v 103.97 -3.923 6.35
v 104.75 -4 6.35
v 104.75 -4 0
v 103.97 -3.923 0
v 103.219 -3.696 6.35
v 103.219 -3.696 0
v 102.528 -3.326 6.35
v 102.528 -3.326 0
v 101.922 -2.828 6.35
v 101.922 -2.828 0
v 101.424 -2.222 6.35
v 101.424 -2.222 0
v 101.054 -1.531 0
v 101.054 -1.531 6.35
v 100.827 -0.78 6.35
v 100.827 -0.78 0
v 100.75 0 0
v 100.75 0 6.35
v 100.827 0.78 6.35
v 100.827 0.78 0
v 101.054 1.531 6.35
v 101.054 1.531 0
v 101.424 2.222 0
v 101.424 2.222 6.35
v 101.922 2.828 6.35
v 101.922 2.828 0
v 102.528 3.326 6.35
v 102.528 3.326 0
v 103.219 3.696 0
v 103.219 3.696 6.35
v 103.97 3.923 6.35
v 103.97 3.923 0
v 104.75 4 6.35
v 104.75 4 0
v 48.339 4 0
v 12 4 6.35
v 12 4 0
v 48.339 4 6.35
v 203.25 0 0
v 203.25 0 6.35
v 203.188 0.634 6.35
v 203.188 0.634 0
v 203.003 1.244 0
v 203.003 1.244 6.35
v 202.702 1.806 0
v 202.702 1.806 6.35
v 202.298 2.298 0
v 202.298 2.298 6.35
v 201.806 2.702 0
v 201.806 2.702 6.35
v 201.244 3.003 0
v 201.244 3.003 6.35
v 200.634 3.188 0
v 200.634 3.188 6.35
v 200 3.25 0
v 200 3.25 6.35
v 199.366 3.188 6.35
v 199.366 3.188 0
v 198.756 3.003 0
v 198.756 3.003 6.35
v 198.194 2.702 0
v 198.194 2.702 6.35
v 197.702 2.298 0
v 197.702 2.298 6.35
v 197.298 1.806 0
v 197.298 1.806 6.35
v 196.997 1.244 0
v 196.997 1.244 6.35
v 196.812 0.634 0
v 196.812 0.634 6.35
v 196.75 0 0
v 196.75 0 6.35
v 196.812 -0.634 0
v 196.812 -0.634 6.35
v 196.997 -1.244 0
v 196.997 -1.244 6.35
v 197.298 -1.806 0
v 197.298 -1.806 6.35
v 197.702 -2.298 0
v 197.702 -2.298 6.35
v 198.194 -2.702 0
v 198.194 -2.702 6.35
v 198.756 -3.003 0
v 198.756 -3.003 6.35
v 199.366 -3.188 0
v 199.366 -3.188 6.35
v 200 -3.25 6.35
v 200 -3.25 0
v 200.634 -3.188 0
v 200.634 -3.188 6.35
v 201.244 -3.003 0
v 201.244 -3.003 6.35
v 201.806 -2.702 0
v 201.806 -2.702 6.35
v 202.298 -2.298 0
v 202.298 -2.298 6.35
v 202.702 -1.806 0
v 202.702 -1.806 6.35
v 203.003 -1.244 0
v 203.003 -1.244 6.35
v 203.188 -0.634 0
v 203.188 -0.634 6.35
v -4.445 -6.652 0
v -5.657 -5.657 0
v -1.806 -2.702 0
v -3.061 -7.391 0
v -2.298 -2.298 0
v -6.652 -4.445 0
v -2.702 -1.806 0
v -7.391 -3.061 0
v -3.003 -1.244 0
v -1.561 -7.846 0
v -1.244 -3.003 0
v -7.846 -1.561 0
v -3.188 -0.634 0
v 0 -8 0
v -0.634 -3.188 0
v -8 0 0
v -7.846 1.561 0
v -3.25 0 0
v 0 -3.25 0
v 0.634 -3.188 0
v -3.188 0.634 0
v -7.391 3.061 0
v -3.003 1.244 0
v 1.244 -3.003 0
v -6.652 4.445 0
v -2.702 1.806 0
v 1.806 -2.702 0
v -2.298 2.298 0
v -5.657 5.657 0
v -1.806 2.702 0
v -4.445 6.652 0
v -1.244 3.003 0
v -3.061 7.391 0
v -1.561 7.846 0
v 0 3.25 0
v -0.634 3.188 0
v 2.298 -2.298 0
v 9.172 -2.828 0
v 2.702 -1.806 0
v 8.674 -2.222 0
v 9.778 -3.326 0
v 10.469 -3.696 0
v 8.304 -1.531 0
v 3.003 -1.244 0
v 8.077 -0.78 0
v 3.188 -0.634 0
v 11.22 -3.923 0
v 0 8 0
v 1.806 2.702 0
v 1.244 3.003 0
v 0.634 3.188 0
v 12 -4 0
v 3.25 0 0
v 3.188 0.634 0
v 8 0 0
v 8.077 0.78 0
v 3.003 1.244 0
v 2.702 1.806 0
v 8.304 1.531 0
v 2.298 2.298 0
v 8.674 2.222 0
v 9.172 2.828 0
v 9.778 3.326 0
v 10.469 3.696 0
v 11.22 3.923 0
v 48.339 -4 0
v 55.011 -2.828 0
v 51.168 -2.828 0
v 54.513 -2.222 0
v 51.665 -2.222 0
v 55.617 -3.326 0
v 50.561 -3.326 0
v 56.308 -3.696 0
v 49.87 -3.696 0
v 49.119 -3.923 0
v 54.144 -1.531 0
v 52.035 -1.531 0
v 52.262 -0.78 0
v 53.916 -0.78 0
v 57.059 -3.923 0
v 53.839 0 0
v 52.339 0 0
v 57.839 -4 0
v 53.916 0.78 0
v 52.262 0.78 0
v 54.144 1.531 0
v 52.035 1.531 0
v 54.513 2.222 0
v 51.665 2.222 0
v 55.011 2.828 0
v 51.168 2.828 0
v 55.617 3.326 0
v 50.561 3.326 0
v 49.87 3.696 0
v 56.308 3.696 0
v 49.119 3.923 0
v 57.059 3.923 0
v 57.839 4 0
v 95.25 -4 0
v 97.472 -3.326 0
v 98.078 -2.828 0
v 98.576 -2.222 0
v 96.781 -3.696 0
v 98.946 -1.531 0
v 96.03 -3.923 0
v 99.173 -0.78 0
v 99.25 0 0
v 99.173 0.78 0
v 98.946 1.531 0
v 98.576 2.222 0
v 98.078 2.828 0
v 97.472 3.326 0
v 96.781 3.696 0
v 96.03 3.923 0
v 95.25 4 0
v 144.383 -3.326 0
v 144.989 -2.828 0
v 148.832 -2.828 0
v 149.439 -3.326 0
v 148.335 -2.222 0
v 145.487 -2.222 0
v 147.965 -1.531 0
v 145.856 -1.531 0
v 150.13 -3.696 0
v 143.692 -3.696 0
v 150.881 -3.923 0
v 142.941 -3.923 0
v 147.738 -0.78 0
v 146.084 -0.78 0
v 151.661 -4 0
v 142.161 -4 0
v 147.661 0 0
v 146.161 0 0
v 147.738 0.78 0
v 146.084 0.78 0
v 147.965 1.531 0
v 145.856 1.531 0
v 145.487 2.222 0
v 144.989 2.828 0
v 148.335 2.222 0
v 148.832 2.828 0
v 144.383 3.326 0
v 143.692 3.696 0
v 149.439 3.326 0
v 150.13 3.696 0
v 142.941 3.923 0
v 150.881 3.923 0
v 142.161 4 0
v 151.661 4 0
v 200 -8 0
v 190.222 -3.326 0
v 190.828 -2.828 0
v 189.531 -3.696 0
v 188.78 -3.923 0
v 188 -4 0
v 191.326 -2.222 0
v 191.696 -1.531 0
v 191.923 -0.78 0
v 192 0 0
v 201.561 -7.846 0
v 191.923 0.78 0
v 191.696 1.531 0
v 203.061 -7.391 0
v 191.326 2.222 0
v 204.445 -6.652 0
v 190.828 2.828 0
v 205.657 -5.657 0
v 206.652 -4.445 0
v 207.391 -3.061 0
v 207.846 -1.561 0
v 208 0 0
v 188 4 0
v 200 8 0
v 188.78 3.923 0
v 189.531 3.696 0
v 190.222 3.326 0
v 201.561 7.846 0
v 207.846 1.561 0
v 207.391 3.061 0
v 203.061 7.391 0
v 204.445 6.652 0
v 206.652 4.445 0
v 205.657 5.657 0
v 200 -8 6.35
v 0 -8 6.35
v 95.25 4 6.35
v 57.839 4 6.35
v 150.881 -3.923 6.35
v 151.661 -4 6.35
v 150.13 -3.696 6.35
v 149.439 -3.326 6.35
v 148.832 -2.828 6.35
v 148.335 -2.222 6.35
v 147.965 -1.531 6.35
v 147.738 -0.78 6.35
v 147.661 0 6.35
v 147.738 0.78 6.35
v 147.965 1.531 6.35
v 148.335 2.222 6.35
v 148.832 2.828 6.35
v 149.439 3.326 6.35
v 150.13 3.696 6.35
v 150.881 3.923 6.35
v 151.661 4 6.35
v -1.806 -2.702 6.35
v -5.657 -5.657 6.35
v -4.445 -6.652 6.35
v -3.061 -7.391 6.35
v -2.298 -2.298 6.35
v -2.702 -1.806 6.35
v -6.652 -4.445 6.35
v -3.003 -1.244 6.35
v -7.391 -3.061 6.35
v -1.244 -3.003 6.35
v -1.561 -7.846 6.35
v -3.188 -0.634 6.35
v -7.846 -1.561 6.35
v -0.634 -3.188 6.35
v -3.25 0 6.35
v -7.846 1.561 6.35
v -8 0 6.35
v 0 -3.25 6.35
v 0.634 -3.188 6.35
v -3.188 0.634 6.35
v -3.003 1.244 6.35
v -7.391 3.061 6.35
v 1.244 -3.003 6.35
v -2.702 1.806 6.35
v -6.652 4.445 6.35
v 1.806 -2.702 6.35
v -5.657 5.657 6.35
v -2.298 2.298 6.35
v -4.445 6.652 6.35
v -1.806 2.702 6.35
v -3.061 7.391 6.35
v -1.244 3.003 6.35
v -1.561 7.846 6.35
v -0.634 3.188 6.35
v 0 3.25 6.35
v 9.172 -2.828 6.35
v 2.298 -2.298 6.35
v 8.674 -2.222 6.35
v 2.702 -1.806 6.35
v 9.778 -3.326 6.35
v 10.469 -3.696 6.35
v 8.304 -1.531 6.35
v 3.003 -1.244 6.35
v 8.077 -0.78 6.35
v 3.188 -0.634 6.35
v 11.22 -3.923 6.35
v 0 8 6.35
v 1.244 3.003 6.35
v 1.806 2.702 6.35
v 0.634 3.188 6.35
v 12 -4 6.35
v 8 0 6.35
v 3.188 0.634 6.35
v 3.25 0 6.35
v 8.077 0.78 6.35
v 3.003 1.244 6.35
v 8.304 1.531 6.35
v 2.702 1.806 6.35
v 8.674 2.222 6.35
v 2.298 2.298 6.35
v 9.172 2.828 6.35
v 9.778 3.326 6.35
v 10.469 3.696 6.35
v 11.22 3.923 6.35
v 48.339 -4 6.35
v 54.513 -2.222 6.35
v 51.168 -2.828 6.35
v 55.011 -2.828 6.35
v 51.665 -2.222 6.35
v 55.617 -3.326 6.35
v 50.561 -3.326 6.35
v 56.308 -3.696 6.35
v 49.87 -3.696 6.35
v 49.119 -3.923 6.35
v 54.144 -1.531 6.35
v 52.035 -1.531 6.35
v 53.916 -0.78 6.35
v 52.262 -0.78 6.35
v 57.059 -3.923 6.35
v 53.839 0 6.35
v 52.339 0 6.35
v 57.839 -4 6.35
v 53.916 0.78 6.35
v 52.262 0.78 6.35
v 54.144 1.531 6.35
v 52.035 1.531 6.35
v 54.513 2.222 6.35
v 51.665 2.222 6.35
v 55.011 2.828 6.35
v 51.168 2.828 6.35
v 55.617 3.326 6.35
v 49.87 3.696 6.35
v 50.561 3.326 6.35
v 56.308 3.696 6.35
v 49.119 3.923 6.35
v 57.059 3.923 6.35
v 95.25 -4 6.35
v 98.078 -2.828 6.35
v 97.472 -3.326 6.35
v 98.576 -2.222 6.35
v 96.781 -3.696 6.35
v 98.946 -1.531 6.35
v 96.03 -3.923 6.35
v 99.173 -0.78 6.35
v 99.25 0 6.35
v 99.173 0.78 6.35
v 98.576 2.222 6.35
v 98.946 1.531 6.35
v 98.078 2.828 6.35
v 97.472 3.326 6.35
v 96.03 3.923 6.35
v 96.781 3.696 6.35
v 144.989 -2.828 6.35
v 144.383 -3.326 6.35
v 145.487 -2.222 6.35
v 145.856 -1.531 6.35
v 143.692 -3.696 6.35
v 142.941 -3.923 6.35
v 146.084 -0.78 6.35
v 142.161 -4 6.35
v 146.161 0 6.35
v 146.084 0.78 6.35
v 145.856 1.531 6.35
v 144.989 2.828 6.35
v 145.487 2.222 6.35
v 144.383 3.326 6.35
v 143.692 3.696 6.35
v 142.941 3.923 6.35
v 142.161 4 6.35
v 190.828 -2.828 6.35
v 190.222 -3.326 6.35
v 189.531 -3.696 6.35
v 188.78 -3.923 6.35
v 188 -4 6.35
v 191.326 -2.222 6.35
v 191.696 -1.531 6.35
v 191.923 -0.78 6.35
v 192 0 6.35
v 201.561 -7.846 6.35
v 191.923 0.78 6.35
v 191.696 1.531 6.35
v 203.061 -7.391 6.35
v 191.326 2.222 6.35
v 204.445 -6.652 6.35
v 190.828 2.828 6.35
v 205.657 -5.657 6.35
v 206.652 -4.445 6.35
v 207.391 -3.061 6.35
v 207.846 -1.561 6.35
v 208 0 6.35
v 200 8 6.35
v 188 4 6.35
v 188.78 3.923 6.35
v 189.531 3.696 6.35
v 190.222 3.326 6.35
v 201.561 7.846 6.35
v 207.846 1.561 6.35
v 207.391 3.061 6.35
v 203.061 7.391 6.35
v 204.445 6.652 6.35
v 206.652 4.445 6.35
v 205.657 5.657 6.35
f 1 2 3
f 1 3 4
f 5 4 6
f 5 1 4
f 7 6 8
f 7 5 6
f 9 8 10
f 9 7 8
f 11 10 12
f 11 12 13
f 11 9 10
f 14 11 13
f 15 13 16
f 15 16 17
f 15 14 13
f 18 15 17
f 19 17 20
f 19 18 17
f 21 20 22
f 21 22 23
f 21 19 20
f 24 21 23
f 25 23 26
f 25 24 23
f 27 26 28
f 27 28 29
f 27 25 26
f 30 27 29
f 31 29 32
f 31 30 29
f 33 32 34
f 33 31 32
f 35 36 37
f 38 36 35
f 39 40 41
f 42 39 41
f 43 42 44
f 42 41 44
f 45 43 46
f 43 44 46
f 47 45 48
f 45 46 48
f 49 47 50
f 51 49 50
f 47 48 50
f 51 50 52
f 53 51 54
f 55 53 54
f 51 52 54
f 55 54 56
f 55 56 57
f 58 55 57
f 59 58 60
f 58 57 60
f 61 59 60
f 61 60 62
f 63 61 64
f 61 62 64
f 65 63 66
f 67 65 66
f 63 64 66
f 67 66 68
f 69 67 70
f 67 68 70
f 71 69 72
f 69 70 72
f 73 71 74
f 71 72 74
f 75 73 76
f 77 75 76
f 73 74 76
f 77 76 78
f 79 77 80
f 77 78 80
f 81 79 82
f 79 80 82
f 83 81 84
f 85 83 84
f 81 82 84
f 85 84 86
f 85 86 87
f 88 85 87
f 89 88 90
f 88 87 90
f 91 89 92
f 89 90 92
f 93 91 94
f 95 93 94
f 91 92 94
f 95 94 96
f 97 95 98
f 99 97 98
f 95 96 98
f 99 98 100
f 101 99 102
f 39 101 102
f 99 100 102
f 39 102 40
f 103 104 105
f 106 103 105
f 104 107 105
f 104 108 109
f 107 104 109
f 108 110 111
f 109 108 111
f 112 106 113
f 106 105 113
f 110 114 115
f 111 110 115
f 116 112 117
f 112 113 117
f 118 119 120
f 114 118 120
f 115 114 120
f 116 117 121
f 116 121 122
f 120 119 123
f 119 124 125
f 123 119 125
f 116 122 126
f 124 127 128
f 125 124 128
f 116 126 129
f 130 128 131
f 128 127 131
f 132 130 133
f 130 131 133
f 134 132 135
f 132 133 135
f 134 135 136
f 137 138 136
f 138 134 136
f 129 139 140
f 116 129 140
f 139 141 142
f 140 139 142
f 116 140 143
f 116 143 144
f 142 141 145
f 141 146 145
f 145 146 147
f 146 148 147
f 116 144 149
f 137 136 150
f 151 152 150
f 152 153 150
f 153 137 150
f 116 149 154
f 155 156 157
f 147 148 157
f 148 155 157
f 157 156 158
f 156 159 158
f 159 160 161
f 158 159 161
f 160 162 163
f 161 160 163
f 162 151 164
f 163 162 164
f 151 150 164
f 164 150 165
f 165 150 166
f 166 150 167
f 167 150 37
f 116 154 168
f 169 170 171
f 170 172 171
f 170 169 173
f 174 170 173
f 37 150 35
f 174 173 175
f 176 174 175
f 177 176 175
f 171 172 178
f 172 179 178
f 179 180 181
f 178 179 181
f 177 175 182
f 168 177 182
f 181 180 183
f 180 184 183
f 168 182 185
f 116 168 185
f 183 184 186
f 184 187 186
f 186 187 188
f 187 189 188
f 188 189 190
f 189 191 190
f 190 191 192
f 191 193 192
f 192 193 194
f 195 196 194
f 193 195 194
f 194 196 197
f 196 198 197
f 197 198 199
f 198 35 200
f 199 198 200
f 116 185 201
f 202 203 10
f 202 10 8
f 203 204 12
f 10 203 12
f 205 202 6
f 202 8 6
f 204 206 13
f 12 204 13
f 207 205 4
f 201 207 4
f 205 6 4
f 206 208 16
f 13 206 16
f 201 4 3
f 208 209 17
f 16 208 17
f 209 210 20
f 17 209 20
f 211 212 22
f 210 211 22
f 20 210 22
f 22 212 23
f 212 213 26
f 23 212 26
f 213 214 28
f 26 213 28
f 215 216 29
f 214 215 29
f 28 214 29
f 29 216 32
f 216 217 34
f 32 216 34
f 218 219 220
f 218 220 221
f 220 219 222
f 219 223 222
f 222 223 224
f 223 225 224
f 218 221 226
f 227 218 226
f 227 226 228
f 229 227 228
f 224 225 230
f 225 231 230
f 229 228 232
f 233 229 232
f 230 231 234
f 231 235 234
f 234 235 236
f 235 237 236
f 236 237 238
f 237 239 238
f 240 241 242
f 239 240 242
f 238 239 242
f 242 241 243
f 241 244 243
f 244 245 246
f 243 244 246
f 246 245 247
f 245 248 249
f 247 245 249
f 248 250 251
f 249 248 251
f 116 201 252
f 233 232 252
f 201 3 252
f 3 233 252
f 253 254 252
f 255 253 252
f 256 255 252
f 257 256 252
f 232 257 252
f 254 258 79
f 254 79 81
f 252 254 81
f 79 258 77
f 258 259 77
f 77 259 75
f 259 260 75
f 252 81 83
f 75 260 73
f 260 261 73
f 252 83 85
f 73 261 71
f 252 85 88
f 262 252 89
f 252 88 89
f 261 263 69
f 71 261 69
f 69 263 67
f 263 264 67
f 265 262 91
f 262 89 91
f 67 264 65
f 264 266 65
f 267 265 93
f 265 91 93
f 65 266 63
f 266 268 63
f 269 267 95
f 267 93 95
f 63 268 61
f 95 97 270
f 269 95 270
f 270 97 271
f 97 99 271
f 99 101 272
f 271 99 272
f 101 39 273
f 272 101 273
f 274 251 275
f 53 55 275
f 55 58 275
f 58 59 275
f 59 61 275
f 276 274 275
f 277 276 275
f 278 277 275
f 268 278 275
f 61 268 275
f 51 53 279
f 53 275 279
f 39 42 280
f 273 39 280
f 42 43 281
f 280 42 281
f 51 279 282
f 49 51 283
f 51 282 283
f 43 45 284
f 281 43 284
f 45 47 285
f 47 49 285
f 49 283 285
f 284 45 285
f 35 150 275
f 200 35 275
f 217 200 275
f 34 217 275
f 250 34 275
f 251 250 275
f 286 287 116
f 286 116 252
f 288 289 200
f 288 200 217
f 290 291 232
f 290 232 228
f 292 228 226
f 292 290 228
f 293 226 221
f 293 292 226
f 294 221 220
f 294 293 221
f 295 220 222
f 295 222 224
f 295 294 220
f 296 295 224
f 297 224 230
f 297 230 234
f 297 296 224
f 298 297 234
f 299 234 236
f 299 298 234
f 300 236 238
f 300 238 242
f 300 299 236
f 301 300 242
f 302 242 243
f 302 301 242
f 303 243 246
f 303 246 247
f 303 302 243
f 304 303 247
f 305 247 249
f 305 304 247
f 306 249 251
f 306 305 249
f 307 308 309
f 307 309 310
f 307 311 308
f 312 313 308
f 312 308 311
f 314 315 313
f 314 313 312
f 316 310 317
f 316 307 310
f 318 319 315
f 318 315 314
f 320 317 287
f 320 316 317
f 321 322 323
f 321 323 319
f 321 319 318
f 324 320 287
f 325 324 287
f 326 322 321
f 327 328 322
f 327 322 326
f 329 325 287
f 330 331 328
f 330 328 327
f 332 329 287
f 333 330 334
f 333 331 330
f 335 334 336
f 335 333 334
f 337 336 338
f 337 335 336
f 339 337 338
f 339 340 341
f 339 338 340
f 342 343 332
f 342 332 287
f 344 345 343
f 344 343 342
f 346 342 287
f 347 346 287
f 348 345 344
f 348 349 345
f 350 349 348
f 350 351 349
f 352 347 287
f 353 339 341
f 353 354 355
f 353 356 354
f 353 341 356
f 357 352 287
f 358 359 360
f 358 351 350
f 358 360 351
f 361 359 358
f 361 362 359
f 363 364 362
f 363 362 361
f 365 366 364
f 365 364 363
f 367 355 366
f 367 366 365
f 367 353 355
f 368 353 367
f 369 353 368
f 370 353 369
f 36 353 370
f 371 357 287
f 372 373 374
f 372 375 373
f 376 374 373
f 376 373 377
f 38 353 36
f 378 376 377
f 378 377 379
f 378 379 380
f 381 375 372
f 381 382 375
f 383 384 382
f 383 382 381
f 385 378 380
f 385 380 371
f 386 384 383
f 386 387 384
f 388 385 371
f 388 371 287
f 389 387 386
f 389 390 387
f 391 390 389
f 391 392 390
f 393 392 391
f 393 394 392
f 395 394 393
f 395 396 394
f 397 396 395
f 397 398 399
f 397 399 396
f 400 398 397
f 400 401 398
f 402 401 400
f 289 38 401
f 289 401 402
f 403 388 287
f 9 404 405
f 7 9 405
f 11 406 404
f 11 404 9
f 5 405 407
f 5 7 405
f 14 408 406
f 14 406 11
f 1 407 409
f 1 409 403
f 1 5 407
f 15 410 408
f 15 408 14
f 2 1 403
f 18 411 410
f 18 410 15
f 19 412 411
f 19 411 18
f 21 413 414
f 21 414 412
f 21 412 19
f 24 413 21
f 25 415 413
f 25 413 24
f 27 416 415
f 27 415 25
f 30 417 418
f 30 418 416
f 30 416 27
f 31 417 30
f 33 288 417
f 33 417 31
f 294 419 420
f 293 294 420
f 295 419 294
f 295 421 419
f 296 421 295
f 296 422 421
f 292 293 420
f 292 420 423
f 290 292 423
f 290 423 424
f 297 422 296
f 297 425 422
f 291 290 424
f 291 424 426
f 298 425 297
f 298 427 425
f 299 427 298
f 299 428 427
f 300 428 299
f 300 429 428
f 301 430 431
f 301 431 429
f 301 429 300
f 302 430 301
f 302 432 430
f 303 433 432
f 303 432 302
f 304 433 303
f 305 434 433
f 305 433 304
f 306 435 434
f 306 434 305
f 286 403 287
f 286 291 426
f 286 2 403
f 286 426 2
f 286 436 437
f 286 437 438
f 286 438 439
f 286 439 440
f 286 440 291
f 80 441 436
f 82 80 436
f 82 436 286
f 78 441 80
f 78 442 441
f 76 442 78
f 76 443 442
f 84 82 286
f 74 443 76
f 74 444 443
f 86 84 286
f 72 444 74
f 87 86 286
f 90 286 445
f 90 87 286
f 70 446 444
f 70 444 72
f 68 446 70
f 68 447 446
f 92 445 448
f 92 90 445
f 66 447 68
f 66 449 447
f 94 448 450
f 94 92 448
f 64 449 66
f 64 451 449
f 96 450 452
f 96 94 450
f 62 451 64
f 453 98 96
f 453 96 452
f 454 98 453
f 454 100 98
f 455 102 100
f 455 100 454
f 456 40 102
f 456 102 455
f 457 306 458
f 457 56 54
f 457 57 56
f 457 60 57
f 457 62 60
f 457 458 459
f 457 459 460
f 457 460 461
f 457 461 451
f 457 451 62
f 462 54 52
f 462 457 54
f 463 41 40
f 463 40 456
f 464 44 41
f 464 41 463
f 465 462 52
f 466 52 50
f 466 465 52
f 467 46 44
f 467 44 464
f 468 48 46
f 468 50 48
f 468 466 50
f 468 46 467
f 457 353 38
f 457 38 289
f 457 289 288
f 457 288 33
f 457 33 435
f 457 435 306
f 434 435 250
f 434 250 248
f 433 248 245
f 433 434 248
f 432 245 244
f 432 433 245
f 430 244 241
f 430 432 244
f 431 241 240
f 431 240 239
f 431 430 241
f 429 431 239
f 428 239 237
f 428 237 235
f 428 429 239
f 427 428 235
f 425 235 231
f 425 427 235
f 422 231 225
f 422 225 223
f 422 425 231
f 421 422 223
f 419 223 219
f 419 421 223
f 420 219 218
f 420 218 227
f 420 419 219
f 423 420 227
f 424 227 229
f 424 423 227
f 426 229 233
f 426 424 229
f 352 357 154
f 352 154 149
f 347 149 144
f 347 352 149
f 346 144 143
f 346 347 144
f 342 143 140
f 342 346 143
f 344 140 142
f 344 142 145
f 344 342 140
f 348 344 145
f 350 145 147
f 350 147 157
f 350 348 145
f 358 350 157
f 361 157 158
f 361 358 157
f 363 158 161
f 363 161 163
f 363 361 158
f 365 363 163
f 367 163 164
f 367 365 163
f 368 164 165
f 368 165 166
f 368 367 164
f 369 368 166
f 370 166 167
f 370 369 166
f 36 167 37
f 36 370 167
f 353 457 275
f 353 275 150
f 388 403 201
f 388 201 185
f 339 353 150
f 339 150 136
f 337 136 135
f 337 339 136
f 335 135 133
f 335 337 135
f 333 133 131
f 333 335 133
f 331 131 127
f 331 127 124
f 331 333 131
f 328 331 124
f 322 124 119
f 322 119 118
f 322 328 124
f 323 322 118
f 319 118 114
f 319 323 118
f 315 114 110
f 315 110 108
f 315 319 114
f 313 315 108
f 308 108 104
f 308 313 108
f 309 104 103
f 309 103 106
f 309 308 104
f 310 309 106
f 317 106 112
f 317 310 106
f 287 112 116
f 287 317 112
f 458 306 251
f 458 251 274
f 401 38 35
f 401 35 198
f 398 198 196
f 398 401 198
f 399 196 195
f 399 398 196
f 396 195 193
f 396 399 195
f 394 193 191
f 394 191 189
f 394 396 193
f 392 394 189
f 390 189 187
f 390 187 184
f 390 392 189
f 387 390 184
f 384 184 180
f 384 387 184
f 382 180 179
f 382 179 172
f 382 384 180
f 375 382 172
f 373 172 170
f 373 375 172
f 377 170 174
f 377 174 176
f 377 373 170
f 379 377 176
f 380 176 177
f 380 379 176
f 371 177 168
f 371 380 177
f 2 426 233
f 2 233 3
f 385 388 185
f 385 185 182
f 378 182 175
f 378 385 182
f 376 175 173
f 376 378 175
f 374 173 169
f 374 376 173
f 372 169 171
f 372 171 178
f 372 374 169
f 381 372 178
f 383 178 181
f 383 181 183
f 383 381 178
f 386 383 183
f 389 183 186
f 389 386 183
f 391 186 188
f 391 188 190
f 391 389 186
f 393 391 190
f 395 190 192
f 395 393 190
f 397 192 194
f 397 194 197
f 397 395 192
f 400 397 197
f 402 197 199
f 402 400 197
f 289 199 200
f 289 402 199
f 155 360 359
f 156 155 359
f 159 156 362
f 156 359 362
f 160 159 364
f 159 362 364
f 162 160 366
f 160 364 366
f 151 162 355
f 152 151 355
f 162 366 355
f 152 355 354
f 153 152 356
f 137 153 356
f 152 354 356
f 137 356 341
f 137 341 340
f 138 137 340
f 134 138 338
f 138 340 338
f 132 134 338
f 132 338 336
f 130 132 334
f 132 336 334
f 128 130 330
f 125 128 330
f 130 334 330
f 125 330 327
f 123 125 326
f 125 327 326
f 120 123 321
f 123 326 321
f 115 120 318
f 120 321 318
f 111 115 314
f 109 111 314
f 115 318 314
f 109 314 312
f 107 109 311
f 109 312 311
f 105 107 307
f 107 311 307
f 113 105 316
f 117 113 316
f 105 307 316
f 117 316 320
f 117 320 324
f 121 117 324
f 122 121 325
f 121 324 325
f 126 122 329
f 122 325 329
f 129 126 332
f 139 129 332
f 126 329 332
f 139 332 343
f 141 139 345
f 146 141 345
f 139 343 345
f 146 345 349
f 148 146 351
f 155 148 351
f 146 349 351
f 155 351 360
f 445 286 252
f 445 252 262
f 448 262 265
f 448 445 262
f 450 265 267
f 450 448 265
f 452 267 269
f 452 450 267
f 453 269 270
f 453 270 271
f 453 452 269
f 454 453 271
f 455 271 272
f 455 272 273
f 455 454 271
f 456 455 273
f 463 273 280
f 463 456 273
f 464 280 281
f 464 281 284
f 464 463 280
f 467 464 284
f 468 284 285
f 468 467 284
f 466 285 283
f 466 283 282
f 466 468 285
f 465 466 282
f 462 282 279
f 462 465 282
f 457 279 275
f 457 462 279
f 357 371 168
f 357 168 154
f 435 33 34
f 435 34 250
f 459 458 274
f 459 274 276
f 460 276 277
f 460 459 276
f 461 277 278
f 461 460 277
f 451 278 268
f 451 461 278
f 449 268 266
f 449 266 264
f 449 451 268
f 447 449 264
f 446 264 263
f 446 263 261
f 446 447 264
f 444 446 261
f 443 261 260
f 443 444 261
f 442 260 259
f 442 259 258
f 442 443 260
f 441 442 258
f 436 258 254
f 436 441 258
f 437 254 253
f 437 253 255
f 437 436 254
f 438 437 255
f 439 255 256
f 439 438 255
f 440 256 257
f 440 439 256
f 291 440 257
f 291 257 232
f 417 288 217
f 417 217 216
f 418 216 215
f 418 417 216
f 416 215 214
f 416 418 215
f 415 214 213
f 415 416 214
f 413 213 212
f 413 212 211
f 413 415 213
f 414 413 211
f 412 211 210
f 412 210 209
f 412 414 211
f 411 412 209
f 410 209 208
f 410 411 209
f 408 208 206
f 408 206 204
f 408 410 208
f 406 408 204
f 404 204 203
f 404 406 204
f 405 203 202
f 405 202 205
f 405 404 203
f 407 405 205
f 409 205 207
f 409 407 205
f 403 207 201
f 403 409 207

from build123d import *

# Parameters (mm, degrees)
SKETCH1_R           = 3.25
BOSS_EXTRUDE1_DEPTH = 6.35


with BuildPart() as part:
    # Sketch1 → Boss-Extrude1 (new body)
    with BuildSketch(Plane.XY.offset(6.35)):
        with BuildLine():
            Line((200, 8), (0, 8))
            ThreePointArc((0, 8), (-8, 0), (0, -8))
            Line((0, -8), (200, -8))
            ThreePointArc((200, -8), (208, 0), (200, 8))
        make_face()
        with Locations((200, 0)):
            Circle(SKETCH1_R, mode=Mode.SUBTRACT)
        Circle(SKETCH1_R, mode=Mode.SUBTRACT)
        with BuildLine():
            Line((104.75, 4), (142.160898385, 4))
            ThreePointArc((142.160898385, 4), (146.160898385, 0), (142.160898385, -4))
            Line((142.160898385, -4), (104.75, -4))
            ThreePointArc((104.75, -4), (100.75, 0), (104.75, 4))
        make_face(mode=Mode.SUBTRACT)
        with BuildLine():
            Line((12, 4), (48.339101615, 4))
            ThreePointArc((48.339101615, 4), (52.339101615, 0), (48.339101615, -4))
            Line((48.339101615, -4), (12, -4))
            ThreePointArc((12, -4), (8, 0), (12, 4))
        make_face(mode=Mode.SUBTRACT)
        with BuildLine():
            Line((57.839101615, 4), (95.25, 4))
            ThreePointArc((95.25, 4), (99.25, 0), (95.25, -4))
            Line((95.25, -4), (57.839101615, -4))
            ThreePointArc((57.839101615, -4), (53.839101615, 0), (57.839101615, 4))
        make_face(mode=Mode.SUBTRACT)
        with BuildLine():
            Line((188, -4), (151.660898385, -4))
            ThreePointArc((151.660898385, -4), (147.660898385, 0), (151.660898385, 4))
            Line((151.660898385, 4), (188, 4))
            ThreePointArc((188, 4), (192, 0), (188, -4))
        make_face(mode=Mode.SUBTRACT)
    extrude(amount=-BOSS_EXTRUDE1_DEPTH)


solid = part.part
